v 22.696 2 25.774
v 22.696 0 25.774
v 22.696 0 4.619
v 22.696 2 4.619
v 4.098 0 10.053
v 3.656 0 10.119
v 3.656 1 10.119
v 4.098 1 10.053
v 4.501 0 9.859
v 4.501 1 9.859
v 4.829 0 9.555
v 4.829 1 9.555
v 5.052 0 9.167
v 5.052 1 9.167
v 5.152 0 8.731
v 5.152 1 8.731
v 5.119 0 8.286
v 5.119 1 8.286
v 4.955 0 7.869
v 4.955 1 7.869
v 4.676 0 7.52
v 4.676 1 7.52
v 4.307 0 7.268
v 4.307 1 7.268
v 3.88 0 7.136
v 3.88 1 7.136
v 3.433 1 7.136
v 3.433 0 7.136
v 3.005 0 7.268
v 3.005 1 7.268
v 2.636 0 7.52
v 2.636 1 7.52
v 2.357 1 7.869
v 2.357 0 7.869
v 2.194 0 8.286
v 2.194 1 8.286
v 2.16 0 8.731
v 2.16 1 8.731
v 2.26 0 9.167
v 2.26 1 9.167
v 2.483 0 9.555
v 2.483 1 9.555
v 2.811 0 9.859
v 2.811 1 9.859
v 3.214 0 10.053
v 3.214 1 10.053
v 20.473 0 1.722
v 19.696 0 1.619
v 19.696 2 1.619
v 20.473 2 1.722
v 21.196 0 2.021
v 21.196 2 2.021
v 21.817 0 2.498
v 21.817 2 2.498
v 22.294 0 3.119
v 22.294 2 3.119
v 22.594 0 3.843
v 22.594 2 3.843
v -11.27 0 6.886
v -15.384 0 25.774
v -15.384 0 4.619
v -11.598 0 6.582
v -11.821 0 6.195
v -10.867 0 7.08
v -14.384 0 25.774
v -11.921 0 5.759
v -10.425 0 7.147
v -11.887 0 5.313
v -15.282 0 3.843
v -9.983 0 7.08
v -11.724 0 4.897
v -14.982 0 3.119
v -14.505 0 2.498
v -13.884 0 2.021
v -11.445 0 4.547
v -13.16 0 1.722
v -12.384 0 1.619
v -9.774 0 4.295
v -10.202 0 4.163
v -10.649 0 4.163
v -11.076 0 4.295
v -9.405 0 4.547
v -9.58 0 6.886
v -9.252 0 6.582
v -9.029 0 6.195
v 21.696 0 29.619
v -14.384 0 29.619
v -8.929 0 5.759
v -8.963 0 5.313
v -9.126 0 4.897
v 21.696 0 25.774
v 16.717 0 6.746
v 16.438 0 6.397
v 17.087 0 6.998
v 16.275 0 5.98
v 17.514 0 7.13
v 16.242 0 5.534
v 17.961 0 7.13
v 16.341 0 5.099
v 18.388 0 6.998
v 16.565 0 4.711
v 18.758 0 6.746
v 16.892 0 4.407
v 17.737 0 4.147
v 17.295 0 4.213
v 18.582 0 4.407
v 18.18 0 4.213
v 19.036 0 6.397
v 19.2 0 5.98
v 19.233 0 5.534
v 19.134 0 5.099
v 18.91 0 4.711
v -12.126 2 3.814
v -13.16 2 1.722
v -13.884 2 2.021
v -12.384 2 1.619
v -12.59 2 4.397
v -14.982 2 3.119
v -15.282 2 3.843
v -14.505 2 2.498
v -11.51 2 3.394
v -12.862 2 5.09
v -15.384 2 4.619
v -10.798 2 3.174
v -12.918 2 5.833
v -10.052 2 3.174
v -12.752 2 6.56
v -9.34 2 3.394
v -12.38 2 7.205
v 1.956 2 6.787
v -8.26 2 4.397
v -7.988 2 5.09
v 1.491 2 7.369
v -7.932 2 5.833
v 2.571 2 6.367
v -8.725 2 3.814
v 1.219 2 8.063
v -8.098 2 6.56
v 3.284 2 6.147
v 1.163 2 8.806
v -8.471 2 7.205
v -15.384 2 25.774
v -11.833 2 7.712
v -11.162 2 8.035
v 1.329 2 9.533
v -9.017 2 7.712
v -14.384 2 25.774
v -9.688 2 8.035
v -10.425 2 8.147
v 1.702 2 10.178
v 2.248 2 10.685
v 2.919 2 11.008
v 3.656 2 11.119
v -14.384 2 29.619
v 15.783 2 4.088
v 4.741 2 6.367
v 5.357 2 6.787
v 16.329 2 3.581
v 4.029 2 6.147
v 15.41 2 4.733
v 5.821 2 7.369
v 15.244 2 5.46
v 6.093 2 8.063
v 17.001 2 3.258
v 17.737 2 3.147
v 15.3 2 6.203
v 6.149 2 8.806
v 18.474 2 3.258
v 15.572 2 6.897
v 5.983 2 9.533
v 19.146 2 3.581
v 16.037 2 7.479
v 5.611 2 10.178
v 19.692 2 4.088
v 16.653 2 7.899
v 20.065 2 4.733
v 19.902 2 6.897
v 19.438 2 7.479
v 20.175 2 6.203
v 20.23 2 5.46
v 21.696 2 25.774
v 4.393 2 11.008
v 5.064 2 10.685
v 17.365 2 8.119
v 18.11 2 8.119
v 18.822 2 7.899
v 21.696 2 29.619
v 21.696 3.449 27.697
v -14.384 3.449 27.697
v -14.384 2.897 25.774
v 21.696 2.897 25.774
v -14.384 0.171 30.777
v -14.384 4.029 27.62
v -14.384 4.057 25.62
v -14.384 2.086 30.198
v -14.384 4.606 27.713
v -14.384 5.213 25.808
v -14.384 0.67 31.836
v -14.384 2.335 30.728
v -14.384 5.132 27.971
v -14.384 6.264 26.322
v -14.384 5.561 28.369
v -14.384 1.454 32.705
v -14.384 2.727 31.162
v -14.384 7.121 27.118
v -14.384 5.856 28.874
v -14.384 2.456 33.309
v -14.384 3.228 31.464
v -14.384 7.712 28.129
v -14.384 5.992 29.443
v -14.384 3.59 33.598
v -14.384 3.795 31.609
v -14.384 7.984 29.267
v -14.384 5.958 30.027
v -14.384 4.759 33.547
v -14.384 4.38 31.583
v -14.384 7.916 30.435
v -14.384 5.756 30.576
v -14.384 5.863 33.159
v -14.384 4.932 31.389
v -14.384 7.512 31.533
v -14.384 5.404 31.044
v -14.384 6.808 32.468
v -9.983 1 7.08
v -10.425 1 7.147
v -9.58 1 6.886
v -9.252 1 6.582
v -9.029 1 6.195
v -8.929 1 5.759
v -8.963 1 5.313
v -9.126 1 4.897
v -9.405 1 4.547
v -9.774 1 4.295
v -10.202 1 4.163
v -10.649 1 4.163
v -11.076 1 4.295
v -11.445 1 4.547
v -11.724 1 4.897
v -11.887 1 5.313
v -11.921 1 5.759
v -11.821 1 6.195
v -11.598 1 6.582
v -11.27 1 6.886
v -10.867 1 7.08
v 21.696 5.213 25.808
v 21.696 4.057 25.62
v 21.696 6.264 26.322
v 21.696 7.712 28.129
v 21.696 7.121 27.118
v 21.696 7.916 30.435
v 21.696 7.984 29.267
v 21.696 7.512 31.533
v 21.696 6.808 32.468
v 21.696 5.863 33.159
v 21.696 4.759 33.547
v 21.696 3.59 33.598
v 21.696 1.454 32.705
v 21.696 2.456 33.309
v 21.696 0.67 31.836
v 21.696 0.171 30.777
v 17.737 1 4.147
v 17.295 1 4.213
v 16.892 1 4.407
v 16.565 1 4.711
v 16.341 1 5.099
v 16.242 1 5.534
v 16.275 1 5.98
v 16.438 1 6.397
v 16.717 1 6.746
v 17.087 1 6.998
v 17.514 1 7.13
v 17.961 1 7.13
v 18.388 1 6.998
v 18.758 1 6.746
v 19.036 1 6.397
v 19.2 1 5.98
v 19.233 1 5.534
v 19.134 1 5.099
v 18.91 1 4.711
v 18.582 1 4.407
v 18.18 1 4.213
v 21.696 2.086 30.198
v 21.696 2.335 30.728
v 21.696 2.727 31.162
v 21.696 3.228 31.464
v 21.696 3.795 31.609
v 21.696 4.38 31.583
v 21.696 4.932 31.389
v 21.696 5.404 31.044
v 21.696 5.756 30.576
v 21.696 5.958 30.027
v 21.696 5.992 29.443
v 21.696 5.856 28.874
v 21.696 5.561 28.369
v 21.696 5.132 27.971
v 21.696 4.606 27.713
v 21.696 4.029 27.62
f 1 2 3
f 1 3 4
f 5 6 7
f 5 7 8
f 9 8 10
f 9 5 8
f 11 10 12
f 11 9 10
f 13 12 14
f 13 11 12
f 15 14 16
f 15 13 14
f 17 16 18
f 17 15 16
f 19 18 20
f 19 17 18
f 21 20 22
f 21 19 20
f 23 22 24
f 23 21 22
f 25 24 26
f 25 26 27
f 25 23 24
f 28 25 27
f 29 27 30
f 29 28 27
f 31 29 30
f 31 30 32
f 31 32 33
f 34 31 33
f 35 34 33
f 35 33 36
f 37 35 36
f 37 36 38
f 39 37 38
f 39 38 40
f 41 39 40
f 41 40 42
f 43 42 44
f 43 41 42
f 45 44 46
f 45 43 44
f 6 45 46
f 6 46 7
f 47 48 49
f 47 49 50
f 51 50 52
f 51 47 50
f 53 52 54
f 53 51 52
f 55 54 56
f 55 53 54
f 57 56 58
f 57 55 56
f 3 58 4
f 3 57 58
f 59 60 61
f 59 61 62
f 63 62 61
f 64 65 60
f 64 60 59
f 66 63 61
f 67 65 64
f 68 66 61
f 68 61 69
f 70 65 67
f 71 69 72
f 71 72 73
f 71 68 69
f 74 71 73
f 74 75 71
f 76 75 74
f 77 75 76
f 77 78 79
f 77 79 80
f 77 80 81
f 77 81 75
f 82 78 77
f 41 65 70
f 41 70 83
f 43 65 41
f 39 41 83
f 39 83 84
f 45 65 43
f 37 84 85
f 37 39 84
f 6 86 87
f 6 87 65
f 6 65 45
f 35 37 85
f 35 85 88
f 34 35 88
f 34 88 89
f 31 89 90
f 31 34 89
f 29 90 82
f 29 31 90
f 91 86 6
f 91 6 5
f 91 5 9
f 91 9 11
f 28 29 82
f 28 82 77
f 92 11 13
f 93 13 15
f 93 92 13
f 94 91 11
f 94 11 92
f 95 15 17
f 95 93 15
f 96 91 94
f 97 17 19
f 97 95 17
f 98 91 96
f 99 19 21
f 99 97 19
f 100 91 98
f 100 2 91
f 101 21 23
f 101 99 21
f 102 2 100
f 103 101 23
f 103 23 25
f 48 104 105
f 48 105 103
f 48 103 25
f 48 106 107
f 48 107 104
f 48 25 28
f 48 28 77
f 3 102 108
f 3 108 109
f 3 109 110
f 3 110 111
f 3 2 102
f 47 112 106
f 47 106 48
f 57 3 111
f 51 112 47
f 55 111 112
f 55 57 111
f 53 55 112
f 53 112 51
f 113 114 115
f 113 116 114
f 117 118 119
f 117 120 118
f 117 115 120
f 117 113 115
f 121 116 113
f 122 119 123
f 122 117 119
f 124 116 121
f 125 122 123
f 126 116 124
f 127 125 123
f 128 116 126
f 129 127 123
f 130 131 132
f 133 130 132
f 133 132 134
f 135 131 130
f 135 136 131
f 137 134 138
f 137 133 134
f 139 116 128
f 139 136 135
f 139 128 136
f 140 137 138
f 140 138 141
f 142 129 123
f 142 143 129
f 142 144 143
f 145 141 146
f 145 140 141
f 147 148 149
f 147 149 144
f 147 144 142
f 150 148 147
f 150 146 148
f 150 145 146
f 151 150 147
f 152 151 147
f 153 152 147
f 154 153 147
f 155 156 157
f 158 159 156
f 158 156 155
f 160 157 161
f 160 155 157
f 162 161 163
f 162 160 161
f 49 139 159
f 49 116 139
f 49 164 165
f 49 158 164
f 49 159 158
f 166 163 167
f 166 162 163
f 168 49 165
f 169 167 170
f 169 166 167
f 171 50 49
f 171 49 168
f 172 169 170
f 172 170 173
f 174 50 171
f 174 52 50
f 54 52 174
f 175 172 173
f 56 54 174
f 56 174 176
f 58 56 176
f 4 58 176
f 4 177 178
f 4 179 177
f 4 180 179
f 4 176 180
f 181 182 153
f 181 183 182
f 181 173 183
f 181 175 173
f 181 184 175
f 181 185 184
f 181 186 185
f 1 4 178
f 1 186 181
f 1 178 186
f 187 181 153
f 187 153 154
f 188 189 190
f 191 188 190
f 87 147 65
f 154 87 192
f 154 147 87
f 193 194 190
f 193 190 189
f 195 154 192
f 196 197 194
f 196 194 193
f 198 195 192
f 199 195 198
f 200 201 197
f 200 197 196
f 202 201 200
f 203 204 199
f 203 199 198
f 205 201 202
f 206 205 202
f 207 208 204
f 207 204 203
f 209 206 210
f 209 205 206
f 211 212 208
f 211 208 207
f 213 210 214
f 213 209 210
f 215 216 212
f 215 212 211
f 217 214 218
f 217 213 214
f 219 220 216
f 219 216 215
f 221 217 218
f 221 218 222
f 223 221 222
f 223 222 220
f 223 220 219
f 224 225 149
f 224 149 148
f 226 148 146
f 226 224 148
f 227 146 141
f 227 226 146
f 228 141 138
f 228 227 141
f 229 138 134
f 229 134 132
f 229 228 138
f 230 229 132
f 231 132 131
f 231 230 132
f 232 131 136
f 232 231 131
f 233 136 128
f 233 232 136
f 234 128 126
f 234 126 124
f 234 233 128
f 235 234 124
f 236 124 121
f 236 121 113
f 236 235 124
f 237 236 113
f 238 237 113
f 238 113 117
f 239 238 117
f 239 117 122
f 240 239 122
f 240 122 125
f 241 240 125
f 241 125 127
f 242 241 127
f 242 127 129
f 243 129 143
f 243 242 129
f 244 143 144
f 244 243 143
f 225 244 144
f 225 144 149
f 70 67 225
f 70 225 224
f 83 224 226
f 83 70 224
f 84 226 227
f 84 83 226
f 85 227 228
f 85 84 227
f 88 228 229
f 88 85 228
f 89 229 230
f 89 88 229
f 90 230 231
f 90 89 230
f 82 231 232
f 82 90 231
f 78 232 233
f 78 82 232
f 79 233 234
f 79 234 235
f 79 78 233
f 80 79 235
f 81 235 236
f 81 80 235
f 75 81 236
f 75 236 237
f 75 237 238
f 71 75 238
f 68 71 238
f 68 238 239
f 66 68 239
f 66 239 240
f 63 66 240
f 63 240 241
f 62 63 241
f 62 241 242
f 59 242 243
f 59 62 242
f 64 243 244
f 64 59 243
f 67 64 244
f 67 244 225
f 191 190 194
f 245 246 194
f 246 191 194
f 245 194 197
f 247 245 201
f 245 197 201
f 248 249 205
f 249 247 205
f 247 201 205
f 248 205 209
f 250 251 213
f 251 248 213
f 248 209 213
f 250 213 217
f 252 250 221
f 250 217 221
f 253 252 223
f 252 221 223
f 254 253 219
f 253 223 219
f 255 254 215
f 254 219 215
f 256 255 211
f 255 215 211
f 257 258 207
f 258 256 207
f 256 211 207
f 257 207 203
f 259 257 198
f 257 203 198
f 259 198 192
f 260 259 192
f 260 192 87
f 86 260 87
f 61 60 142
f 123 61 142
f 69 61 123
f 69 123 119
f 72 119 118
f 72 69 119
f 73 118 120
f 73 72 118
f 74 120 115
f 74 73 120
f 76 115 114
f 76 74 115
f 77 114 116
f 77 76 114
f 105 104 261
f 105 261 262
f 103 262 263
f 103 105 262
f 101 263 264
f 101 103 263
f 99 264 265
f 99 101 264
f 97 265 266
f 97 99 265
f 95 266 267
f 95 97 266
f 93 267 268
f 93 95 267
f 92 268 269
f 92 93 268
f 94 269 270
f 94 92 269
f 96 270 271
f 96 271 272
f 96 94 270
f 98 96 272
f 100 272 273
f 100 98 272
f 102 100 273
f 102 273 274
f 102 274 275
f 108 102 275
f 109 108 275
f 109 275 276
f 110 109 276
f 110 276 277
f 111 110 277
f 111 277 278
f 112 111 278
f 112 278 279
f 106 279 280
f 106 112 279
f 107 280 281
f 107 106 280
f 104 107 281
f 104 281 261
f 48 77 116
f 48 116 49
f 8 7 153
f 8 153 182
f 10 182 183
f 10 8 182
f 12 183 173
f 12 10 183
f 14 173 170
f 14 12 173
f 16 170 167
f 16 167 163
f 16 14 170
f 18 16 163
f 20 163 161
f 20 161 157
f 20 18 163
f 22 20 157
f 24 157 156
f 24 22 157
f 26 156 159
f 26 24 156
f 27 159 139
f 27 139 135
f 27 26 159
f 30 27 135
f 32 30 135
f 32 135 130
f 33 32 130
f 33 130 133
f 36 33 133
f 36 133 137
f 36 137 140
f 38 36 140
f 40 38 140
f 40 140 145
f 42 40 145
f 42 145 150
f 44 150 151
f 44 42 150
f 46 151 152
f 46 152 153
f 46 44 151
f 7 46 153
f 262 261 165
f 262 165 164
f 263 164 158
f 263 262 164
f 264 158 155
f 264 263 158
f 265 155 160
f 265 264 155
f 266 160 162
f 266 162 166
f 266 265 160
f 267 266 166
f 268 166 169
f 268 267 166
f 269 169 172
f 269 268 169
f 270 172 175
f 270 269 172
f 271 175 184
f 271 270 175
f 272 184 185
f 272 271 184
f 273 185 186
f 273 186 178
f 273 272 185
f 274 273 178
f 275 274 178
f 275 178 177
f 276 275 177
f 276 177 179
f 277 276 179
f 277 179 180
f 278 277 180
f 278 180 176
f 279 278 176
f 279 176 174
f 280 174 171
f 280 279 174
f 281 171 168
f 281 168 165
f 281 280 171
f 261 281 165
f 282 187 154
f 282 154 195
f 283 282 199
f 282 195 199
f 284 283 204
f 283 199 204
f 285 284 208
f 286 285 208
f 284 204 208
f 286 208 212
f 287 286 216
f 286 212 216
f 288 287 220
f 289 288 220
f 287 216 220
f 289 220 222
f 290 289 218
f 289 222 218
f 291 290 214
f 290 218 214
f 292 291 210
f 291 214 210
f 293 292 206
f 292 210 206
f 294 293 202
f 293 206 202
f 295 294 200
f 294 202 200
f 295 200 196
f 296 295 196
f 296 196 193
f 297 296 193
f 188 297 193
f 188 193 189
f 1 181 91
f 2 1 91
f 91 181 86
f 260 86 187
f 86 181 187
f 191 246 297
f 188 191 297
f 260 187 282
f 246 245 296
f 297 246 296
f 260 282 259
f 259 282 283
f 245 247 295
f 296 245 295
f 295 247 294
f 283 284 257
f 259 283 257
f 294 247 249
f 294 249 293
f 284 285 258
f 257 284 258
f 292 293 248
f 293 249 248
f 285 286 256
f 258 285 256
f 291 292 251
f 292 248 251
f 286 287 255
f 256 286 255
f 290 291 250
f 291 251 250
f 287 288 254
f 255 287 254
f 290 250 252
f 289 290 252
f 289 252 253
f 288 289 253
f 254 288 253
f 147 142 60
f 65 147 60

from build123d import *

# Parameters (mm, degrees)
IZIM1_R                     = 1.5
Y_KSEKLIK_EKSTR_ZYON1_DEPTH = 2
Y_KSEKLIK_EKSTR_ZYON2_DEPTH = 38.08
KAT_Y_D_N_T_R1_START        = 2
KAT_Y_D_N_T_R1_OUTLINE_W    = 38.08
KAT_Y_D_N_T_R1_OUTLINE_H    = 11
KAT_Y_D_N_T_R1_DEPTH        = 6
KENAR_START                 = -15.383826754
KENAR_EKME1_DEPTH           = 38.08
PAH2_SIZE                   = 1
KES_EKSTR_ZYON1_START       = -1
KES_EKSTR_ZYON1_DEPTH       = 1
KES_EKSTR_ZYON2_DEPTH       = 1


# Read off the part's stored shape, not the designer's step: Katıyı-Dönüştür1, Kenar Çekme1
with BuildPart() as part:
    # Çizim1 → Yükseklik-Ekstrüzyon1 (new body)
    with BuildSketch(Plane(origin=(0, 0, 0), x_dir=(1, 0, 0), z_dir=(0, 1, 0))):
        with BuildLine():
            Line((-12.383826754, -1.619350185), (-2.804796795, -1.619350185))
            Line((-2.804796795, -1.619350185), (19.696173246, -1.619350185))
            ThreePointArc((19.696173246, -1.619350185), (21.81749359, -2.498029841), (22.696173246, -4.619350185))
            Line((22.696173246, -4.619350185), (22.696173246, -24.732233603))
            Line((22.696173246, -24.732233603), (22.696173246, -29.619350185))
            Line((22.696173246, -29.619350185), (-15.383826754, -29.619350185))
            Line((-15.383826754, -29.619350185), (-15.383826754, -12.116060357))
            Line((-15.383826754, -12.116060357), (-15.383826754, -4.619350185))
            ThreePointArc((-15.383826754, -4.619350185), (-14.505147098, -2.498029841), (-12.383826754, -1.619350185))
        make_face()
        with Locations(Location((3.656173246, -8.619350185, 0), (0, 0, 270))):
            Circle(IZIM1_R, mode=Mode.SUBTRACT)
        with Locations(Location((-10.425087976, -5.646549714, 0), (0, 0, 270))):
            Circle(IZIM1_R, mode=Mode.SUBTRACT)
        with Locations(Location((17.737434468, -5.646549714, 0), (0, 0, 90))):
            Circle(IZIM1_R, mode=Mode.SUBTRACT)
    extrude(amount=Y_KSEKLIK_EKSTR_ZYON1_DEPTH)

    # Çizim2 → Yükseklik-Ekstrüzyon2 (add)
    with BuildSketch(Plane(origin=(22.696173246, 0, 0), x_dir=(0, 0, -1), z_dir=(1, 0, 0))):
        with BuildLine():
            Line((-19.271126131, 3), (-17.130193592, 3))
            ThreePointArc((-17.130193592, 3), (-23.452666681, 7.16227766), (-21.003176939, 0))
            Line((-21.003176939, 0), (-17.003176939, 0))
            Line((-17.003176939, 0), (-17.003176939, 2))
            Line((-17.003176939, 2), (-21.003176939, 2))
            ThreePointArc((-21.003176939, 2), (-22.003176939, 5.732050808), (-19.271126131, 3))
        make_face()
    extrude(amount=-Y_KSEKLIK_EKSTR_ZYON2_DEPTH)

    # Katıyı-Dönüştür1 outline → Katıyı-Dönüştür1 (cut)
    with BuildSketch(Plane(origin=(0, 0, 0), x_dir=(1, 0, 0), z_dir=(0, 1, 0)).offset(KAT_Y_D_N_T_R1_START)):
        with Locations((3.656173246, -21.5)):
            Rectangle(KAT_Y_D_N_T_R1_OUTLINE_W, KAT_Y_D_N_T_R1_OUTLINE_H)
    extrude(amount=KAT_Y_D_N_T_R1_DEPTH, mode=Mode.SUBTRACT)

    # Kenar Çekme1 outline → Kenar Çekme1 (add)
    with BuildSketch(Plane.YZ.offset(KENAR_START)):
        with BuildLine():
            Line((3.448725288, 27.696826793), (2.897450577, 25.774303401))
            ThreePointArc((2.897450577, 25.774303401), (7.19454204, 32.026610277), (0, 29.619350185))
            Line((0, 29.619350185), (2, 29.619350185))
            ThreePointArc((2, 29.619350185), (5.59727102, 30.822980231), (3.448725288, 27.696826793))
        make_face()
    extrude(amount=KENAR_EKME1_DEPTH)

    # Pah2
    pah2_edges = [part.edges().sort_by_distance(p)[0] for p in [
        (-10.425087976, 2, 4.146549714),
        (3.656173246, 2, 7.119350185),
        (17.737434468, 2, 7.146549714),
    ]]
    chamfer(pah2_edges, length=PAH2_SIZE)

    # Çizim11 → Kes-Ekstrüzyon1 (cut)
    with BuildSketch(Plane(origin=(22.696173246, 0, 0), x_dir=(0, 0, -1), z_dir=(1, 0, 0)).offset(KES_EKSTR_ZYON1_START)):
        with BuildLine():
            Line((-25.774303401, 2.897450577), (-25.774303401, 0))
            Line((-25.774303401, 0), (-29.619350185, 0))
            ThreePointArc((-29.619350185, 0), (-32.026610277, 7.19454204), (-25.774303401, 2.897450577))
        make_face()
    extrude(amount=KES_EKSTR_ZYON1_DEPTH, mode=Mode.SUBTRACT)

    # Çizim12 → Kes-Ekstrüzyon2 (cut)
    with BuildSketch(Plane.ZY.offset(15.383826754)):
        with BuildLine():
            Line((25.774303401, 2.897450577), (25.774303401, 0))
            Line((25.774303401, 0), (29.619350185, 0))
            ThreePointArc((29.619350185, 0), (32.026610277, 7.19454204), (25.774303401, 2.897450577))
        make_face()
    extrude(amount=-KES_EKSTR_ZYON2_DEPTH, mode=Mode.SUBTRACT)


solid = part.part
